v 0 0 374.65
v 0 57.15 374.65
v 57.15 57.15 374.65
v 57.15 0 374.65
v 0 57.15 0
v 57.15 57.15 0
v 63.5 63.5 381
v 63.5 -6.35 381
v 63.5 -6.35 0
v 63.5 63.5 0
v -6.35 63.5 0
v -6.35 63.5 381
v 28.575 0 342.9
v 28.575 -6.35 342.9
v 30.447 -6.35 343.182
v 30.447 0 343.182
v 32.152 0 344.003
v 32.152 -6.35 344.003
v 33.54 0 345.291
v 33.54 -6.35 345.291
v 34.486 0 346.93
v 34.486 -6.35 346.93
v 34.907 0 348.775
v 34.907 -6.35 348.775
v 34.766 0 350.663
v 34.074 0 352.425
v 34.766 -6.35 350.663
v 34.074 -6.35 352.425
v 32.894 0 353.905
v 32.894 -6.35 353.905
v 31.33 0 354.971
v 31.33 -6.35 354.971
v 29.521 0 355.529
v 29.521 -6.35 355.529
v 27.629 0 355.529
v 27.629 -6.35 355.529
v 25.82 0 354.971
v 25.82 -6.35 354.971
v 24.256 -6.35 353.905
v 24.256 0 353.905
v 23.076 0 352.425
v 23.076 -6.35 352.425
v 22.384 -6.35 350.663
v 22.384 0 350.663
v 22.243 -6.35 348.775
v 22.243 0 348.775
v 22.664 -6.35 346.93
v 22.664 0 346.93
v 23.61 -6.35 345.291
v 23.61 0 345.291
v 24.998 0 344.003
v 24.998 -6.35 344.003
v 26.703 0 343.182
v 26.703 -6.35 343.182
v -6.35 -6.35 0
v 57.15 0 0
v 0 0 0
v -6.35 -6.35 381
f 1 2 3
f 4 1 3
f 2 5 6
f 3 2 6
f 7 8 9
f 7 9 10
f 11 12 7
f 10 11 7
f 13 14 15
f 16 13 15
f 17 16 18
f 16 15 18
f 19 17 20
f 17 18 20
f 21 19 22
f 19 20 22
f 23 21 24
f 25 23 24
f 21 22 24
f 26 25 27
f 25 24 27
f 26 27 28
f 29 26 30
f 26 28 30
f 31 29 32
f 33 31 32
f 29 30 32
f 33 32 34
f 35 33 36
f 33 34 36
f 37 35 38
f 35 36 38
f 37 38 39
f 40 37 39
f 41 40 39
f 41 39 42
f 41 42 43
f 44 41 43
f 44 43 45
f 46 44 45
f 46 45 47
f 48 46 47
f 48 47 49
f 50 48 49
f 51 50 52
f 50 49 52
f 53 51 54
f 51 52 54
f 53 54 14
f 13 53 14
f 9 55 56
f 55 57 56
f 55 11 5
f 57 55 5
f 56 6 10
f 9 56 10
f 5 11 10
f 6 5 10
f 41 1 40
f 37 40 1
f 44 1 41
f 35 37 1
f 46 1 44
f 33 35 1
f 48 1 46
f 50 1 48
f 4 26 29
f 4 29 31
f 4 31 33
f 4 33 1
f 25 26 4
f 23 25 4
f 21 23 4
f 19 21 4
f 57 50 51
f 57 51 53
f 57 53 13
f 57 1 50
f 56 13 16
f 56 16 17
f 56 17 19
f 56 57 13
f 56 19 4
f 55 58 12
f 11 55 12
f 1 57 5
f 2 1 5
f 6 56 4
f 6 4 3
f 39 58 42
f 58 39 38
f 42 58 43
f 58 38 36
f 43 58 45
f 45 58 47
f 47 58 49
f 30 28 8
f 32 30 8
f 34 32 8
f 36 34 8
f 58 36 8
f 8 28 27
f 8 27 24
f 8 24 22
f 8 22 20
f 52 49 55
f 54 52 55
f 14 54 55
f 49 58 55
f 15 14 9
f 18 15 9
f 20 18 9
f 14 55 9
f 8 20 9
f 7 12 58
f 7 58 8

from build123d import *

# Parameters (mm, degrees)
SKETCH1_W           = 69.85
SKETCH1_H           = 69.85
BOSS_EXTRUDE1_DEPTH = 381
SKETCH1_3_W         = 57.15
SKETCH1_3_H         = 57.15
CUT_EXTRUDE1_DEPTH  = 374.65
SKETCH2_R           = 6.35
CUT_EXTRUDE2_DEPTH  = 6.35


with BuildPart() as part:
    # Sketch1 → Boss-Extrude1 (new body)
    with BuildSketch(Plane.XY):
        with Locations((28.575, 28.575)):
            Rectangle(SKETCH1_W, SKETCH1_H)
    extrude(amount=BOSS_EXTRUDE1_DEPTH)

    # Sketch1<3> → Cut-Extrude1 (cut)
    with BuildSketch(Plane.XY):
        with Locations((28.575, 28.575)):
            Rectangle(SKETCH1_3_W, SKETCH1_3_H)
    extrude(amount=CUT_EXTRUDE1_DEPTH, mode=Mode.SUBTRACT)

    # Sketch2 → Cut-Extrude2 (cut)
    with BuildSketch(Plane.XZ.offset(6.35)):
        with Locations(Location((28.575, 349.25, 0), (0, 0, 270))):
            Circle(SKETCH2_R)
    extrude(amount=-CUT_EXTRUDE2_DEPTH, mode=Mode.SUBTRACT)


solid = part.part
